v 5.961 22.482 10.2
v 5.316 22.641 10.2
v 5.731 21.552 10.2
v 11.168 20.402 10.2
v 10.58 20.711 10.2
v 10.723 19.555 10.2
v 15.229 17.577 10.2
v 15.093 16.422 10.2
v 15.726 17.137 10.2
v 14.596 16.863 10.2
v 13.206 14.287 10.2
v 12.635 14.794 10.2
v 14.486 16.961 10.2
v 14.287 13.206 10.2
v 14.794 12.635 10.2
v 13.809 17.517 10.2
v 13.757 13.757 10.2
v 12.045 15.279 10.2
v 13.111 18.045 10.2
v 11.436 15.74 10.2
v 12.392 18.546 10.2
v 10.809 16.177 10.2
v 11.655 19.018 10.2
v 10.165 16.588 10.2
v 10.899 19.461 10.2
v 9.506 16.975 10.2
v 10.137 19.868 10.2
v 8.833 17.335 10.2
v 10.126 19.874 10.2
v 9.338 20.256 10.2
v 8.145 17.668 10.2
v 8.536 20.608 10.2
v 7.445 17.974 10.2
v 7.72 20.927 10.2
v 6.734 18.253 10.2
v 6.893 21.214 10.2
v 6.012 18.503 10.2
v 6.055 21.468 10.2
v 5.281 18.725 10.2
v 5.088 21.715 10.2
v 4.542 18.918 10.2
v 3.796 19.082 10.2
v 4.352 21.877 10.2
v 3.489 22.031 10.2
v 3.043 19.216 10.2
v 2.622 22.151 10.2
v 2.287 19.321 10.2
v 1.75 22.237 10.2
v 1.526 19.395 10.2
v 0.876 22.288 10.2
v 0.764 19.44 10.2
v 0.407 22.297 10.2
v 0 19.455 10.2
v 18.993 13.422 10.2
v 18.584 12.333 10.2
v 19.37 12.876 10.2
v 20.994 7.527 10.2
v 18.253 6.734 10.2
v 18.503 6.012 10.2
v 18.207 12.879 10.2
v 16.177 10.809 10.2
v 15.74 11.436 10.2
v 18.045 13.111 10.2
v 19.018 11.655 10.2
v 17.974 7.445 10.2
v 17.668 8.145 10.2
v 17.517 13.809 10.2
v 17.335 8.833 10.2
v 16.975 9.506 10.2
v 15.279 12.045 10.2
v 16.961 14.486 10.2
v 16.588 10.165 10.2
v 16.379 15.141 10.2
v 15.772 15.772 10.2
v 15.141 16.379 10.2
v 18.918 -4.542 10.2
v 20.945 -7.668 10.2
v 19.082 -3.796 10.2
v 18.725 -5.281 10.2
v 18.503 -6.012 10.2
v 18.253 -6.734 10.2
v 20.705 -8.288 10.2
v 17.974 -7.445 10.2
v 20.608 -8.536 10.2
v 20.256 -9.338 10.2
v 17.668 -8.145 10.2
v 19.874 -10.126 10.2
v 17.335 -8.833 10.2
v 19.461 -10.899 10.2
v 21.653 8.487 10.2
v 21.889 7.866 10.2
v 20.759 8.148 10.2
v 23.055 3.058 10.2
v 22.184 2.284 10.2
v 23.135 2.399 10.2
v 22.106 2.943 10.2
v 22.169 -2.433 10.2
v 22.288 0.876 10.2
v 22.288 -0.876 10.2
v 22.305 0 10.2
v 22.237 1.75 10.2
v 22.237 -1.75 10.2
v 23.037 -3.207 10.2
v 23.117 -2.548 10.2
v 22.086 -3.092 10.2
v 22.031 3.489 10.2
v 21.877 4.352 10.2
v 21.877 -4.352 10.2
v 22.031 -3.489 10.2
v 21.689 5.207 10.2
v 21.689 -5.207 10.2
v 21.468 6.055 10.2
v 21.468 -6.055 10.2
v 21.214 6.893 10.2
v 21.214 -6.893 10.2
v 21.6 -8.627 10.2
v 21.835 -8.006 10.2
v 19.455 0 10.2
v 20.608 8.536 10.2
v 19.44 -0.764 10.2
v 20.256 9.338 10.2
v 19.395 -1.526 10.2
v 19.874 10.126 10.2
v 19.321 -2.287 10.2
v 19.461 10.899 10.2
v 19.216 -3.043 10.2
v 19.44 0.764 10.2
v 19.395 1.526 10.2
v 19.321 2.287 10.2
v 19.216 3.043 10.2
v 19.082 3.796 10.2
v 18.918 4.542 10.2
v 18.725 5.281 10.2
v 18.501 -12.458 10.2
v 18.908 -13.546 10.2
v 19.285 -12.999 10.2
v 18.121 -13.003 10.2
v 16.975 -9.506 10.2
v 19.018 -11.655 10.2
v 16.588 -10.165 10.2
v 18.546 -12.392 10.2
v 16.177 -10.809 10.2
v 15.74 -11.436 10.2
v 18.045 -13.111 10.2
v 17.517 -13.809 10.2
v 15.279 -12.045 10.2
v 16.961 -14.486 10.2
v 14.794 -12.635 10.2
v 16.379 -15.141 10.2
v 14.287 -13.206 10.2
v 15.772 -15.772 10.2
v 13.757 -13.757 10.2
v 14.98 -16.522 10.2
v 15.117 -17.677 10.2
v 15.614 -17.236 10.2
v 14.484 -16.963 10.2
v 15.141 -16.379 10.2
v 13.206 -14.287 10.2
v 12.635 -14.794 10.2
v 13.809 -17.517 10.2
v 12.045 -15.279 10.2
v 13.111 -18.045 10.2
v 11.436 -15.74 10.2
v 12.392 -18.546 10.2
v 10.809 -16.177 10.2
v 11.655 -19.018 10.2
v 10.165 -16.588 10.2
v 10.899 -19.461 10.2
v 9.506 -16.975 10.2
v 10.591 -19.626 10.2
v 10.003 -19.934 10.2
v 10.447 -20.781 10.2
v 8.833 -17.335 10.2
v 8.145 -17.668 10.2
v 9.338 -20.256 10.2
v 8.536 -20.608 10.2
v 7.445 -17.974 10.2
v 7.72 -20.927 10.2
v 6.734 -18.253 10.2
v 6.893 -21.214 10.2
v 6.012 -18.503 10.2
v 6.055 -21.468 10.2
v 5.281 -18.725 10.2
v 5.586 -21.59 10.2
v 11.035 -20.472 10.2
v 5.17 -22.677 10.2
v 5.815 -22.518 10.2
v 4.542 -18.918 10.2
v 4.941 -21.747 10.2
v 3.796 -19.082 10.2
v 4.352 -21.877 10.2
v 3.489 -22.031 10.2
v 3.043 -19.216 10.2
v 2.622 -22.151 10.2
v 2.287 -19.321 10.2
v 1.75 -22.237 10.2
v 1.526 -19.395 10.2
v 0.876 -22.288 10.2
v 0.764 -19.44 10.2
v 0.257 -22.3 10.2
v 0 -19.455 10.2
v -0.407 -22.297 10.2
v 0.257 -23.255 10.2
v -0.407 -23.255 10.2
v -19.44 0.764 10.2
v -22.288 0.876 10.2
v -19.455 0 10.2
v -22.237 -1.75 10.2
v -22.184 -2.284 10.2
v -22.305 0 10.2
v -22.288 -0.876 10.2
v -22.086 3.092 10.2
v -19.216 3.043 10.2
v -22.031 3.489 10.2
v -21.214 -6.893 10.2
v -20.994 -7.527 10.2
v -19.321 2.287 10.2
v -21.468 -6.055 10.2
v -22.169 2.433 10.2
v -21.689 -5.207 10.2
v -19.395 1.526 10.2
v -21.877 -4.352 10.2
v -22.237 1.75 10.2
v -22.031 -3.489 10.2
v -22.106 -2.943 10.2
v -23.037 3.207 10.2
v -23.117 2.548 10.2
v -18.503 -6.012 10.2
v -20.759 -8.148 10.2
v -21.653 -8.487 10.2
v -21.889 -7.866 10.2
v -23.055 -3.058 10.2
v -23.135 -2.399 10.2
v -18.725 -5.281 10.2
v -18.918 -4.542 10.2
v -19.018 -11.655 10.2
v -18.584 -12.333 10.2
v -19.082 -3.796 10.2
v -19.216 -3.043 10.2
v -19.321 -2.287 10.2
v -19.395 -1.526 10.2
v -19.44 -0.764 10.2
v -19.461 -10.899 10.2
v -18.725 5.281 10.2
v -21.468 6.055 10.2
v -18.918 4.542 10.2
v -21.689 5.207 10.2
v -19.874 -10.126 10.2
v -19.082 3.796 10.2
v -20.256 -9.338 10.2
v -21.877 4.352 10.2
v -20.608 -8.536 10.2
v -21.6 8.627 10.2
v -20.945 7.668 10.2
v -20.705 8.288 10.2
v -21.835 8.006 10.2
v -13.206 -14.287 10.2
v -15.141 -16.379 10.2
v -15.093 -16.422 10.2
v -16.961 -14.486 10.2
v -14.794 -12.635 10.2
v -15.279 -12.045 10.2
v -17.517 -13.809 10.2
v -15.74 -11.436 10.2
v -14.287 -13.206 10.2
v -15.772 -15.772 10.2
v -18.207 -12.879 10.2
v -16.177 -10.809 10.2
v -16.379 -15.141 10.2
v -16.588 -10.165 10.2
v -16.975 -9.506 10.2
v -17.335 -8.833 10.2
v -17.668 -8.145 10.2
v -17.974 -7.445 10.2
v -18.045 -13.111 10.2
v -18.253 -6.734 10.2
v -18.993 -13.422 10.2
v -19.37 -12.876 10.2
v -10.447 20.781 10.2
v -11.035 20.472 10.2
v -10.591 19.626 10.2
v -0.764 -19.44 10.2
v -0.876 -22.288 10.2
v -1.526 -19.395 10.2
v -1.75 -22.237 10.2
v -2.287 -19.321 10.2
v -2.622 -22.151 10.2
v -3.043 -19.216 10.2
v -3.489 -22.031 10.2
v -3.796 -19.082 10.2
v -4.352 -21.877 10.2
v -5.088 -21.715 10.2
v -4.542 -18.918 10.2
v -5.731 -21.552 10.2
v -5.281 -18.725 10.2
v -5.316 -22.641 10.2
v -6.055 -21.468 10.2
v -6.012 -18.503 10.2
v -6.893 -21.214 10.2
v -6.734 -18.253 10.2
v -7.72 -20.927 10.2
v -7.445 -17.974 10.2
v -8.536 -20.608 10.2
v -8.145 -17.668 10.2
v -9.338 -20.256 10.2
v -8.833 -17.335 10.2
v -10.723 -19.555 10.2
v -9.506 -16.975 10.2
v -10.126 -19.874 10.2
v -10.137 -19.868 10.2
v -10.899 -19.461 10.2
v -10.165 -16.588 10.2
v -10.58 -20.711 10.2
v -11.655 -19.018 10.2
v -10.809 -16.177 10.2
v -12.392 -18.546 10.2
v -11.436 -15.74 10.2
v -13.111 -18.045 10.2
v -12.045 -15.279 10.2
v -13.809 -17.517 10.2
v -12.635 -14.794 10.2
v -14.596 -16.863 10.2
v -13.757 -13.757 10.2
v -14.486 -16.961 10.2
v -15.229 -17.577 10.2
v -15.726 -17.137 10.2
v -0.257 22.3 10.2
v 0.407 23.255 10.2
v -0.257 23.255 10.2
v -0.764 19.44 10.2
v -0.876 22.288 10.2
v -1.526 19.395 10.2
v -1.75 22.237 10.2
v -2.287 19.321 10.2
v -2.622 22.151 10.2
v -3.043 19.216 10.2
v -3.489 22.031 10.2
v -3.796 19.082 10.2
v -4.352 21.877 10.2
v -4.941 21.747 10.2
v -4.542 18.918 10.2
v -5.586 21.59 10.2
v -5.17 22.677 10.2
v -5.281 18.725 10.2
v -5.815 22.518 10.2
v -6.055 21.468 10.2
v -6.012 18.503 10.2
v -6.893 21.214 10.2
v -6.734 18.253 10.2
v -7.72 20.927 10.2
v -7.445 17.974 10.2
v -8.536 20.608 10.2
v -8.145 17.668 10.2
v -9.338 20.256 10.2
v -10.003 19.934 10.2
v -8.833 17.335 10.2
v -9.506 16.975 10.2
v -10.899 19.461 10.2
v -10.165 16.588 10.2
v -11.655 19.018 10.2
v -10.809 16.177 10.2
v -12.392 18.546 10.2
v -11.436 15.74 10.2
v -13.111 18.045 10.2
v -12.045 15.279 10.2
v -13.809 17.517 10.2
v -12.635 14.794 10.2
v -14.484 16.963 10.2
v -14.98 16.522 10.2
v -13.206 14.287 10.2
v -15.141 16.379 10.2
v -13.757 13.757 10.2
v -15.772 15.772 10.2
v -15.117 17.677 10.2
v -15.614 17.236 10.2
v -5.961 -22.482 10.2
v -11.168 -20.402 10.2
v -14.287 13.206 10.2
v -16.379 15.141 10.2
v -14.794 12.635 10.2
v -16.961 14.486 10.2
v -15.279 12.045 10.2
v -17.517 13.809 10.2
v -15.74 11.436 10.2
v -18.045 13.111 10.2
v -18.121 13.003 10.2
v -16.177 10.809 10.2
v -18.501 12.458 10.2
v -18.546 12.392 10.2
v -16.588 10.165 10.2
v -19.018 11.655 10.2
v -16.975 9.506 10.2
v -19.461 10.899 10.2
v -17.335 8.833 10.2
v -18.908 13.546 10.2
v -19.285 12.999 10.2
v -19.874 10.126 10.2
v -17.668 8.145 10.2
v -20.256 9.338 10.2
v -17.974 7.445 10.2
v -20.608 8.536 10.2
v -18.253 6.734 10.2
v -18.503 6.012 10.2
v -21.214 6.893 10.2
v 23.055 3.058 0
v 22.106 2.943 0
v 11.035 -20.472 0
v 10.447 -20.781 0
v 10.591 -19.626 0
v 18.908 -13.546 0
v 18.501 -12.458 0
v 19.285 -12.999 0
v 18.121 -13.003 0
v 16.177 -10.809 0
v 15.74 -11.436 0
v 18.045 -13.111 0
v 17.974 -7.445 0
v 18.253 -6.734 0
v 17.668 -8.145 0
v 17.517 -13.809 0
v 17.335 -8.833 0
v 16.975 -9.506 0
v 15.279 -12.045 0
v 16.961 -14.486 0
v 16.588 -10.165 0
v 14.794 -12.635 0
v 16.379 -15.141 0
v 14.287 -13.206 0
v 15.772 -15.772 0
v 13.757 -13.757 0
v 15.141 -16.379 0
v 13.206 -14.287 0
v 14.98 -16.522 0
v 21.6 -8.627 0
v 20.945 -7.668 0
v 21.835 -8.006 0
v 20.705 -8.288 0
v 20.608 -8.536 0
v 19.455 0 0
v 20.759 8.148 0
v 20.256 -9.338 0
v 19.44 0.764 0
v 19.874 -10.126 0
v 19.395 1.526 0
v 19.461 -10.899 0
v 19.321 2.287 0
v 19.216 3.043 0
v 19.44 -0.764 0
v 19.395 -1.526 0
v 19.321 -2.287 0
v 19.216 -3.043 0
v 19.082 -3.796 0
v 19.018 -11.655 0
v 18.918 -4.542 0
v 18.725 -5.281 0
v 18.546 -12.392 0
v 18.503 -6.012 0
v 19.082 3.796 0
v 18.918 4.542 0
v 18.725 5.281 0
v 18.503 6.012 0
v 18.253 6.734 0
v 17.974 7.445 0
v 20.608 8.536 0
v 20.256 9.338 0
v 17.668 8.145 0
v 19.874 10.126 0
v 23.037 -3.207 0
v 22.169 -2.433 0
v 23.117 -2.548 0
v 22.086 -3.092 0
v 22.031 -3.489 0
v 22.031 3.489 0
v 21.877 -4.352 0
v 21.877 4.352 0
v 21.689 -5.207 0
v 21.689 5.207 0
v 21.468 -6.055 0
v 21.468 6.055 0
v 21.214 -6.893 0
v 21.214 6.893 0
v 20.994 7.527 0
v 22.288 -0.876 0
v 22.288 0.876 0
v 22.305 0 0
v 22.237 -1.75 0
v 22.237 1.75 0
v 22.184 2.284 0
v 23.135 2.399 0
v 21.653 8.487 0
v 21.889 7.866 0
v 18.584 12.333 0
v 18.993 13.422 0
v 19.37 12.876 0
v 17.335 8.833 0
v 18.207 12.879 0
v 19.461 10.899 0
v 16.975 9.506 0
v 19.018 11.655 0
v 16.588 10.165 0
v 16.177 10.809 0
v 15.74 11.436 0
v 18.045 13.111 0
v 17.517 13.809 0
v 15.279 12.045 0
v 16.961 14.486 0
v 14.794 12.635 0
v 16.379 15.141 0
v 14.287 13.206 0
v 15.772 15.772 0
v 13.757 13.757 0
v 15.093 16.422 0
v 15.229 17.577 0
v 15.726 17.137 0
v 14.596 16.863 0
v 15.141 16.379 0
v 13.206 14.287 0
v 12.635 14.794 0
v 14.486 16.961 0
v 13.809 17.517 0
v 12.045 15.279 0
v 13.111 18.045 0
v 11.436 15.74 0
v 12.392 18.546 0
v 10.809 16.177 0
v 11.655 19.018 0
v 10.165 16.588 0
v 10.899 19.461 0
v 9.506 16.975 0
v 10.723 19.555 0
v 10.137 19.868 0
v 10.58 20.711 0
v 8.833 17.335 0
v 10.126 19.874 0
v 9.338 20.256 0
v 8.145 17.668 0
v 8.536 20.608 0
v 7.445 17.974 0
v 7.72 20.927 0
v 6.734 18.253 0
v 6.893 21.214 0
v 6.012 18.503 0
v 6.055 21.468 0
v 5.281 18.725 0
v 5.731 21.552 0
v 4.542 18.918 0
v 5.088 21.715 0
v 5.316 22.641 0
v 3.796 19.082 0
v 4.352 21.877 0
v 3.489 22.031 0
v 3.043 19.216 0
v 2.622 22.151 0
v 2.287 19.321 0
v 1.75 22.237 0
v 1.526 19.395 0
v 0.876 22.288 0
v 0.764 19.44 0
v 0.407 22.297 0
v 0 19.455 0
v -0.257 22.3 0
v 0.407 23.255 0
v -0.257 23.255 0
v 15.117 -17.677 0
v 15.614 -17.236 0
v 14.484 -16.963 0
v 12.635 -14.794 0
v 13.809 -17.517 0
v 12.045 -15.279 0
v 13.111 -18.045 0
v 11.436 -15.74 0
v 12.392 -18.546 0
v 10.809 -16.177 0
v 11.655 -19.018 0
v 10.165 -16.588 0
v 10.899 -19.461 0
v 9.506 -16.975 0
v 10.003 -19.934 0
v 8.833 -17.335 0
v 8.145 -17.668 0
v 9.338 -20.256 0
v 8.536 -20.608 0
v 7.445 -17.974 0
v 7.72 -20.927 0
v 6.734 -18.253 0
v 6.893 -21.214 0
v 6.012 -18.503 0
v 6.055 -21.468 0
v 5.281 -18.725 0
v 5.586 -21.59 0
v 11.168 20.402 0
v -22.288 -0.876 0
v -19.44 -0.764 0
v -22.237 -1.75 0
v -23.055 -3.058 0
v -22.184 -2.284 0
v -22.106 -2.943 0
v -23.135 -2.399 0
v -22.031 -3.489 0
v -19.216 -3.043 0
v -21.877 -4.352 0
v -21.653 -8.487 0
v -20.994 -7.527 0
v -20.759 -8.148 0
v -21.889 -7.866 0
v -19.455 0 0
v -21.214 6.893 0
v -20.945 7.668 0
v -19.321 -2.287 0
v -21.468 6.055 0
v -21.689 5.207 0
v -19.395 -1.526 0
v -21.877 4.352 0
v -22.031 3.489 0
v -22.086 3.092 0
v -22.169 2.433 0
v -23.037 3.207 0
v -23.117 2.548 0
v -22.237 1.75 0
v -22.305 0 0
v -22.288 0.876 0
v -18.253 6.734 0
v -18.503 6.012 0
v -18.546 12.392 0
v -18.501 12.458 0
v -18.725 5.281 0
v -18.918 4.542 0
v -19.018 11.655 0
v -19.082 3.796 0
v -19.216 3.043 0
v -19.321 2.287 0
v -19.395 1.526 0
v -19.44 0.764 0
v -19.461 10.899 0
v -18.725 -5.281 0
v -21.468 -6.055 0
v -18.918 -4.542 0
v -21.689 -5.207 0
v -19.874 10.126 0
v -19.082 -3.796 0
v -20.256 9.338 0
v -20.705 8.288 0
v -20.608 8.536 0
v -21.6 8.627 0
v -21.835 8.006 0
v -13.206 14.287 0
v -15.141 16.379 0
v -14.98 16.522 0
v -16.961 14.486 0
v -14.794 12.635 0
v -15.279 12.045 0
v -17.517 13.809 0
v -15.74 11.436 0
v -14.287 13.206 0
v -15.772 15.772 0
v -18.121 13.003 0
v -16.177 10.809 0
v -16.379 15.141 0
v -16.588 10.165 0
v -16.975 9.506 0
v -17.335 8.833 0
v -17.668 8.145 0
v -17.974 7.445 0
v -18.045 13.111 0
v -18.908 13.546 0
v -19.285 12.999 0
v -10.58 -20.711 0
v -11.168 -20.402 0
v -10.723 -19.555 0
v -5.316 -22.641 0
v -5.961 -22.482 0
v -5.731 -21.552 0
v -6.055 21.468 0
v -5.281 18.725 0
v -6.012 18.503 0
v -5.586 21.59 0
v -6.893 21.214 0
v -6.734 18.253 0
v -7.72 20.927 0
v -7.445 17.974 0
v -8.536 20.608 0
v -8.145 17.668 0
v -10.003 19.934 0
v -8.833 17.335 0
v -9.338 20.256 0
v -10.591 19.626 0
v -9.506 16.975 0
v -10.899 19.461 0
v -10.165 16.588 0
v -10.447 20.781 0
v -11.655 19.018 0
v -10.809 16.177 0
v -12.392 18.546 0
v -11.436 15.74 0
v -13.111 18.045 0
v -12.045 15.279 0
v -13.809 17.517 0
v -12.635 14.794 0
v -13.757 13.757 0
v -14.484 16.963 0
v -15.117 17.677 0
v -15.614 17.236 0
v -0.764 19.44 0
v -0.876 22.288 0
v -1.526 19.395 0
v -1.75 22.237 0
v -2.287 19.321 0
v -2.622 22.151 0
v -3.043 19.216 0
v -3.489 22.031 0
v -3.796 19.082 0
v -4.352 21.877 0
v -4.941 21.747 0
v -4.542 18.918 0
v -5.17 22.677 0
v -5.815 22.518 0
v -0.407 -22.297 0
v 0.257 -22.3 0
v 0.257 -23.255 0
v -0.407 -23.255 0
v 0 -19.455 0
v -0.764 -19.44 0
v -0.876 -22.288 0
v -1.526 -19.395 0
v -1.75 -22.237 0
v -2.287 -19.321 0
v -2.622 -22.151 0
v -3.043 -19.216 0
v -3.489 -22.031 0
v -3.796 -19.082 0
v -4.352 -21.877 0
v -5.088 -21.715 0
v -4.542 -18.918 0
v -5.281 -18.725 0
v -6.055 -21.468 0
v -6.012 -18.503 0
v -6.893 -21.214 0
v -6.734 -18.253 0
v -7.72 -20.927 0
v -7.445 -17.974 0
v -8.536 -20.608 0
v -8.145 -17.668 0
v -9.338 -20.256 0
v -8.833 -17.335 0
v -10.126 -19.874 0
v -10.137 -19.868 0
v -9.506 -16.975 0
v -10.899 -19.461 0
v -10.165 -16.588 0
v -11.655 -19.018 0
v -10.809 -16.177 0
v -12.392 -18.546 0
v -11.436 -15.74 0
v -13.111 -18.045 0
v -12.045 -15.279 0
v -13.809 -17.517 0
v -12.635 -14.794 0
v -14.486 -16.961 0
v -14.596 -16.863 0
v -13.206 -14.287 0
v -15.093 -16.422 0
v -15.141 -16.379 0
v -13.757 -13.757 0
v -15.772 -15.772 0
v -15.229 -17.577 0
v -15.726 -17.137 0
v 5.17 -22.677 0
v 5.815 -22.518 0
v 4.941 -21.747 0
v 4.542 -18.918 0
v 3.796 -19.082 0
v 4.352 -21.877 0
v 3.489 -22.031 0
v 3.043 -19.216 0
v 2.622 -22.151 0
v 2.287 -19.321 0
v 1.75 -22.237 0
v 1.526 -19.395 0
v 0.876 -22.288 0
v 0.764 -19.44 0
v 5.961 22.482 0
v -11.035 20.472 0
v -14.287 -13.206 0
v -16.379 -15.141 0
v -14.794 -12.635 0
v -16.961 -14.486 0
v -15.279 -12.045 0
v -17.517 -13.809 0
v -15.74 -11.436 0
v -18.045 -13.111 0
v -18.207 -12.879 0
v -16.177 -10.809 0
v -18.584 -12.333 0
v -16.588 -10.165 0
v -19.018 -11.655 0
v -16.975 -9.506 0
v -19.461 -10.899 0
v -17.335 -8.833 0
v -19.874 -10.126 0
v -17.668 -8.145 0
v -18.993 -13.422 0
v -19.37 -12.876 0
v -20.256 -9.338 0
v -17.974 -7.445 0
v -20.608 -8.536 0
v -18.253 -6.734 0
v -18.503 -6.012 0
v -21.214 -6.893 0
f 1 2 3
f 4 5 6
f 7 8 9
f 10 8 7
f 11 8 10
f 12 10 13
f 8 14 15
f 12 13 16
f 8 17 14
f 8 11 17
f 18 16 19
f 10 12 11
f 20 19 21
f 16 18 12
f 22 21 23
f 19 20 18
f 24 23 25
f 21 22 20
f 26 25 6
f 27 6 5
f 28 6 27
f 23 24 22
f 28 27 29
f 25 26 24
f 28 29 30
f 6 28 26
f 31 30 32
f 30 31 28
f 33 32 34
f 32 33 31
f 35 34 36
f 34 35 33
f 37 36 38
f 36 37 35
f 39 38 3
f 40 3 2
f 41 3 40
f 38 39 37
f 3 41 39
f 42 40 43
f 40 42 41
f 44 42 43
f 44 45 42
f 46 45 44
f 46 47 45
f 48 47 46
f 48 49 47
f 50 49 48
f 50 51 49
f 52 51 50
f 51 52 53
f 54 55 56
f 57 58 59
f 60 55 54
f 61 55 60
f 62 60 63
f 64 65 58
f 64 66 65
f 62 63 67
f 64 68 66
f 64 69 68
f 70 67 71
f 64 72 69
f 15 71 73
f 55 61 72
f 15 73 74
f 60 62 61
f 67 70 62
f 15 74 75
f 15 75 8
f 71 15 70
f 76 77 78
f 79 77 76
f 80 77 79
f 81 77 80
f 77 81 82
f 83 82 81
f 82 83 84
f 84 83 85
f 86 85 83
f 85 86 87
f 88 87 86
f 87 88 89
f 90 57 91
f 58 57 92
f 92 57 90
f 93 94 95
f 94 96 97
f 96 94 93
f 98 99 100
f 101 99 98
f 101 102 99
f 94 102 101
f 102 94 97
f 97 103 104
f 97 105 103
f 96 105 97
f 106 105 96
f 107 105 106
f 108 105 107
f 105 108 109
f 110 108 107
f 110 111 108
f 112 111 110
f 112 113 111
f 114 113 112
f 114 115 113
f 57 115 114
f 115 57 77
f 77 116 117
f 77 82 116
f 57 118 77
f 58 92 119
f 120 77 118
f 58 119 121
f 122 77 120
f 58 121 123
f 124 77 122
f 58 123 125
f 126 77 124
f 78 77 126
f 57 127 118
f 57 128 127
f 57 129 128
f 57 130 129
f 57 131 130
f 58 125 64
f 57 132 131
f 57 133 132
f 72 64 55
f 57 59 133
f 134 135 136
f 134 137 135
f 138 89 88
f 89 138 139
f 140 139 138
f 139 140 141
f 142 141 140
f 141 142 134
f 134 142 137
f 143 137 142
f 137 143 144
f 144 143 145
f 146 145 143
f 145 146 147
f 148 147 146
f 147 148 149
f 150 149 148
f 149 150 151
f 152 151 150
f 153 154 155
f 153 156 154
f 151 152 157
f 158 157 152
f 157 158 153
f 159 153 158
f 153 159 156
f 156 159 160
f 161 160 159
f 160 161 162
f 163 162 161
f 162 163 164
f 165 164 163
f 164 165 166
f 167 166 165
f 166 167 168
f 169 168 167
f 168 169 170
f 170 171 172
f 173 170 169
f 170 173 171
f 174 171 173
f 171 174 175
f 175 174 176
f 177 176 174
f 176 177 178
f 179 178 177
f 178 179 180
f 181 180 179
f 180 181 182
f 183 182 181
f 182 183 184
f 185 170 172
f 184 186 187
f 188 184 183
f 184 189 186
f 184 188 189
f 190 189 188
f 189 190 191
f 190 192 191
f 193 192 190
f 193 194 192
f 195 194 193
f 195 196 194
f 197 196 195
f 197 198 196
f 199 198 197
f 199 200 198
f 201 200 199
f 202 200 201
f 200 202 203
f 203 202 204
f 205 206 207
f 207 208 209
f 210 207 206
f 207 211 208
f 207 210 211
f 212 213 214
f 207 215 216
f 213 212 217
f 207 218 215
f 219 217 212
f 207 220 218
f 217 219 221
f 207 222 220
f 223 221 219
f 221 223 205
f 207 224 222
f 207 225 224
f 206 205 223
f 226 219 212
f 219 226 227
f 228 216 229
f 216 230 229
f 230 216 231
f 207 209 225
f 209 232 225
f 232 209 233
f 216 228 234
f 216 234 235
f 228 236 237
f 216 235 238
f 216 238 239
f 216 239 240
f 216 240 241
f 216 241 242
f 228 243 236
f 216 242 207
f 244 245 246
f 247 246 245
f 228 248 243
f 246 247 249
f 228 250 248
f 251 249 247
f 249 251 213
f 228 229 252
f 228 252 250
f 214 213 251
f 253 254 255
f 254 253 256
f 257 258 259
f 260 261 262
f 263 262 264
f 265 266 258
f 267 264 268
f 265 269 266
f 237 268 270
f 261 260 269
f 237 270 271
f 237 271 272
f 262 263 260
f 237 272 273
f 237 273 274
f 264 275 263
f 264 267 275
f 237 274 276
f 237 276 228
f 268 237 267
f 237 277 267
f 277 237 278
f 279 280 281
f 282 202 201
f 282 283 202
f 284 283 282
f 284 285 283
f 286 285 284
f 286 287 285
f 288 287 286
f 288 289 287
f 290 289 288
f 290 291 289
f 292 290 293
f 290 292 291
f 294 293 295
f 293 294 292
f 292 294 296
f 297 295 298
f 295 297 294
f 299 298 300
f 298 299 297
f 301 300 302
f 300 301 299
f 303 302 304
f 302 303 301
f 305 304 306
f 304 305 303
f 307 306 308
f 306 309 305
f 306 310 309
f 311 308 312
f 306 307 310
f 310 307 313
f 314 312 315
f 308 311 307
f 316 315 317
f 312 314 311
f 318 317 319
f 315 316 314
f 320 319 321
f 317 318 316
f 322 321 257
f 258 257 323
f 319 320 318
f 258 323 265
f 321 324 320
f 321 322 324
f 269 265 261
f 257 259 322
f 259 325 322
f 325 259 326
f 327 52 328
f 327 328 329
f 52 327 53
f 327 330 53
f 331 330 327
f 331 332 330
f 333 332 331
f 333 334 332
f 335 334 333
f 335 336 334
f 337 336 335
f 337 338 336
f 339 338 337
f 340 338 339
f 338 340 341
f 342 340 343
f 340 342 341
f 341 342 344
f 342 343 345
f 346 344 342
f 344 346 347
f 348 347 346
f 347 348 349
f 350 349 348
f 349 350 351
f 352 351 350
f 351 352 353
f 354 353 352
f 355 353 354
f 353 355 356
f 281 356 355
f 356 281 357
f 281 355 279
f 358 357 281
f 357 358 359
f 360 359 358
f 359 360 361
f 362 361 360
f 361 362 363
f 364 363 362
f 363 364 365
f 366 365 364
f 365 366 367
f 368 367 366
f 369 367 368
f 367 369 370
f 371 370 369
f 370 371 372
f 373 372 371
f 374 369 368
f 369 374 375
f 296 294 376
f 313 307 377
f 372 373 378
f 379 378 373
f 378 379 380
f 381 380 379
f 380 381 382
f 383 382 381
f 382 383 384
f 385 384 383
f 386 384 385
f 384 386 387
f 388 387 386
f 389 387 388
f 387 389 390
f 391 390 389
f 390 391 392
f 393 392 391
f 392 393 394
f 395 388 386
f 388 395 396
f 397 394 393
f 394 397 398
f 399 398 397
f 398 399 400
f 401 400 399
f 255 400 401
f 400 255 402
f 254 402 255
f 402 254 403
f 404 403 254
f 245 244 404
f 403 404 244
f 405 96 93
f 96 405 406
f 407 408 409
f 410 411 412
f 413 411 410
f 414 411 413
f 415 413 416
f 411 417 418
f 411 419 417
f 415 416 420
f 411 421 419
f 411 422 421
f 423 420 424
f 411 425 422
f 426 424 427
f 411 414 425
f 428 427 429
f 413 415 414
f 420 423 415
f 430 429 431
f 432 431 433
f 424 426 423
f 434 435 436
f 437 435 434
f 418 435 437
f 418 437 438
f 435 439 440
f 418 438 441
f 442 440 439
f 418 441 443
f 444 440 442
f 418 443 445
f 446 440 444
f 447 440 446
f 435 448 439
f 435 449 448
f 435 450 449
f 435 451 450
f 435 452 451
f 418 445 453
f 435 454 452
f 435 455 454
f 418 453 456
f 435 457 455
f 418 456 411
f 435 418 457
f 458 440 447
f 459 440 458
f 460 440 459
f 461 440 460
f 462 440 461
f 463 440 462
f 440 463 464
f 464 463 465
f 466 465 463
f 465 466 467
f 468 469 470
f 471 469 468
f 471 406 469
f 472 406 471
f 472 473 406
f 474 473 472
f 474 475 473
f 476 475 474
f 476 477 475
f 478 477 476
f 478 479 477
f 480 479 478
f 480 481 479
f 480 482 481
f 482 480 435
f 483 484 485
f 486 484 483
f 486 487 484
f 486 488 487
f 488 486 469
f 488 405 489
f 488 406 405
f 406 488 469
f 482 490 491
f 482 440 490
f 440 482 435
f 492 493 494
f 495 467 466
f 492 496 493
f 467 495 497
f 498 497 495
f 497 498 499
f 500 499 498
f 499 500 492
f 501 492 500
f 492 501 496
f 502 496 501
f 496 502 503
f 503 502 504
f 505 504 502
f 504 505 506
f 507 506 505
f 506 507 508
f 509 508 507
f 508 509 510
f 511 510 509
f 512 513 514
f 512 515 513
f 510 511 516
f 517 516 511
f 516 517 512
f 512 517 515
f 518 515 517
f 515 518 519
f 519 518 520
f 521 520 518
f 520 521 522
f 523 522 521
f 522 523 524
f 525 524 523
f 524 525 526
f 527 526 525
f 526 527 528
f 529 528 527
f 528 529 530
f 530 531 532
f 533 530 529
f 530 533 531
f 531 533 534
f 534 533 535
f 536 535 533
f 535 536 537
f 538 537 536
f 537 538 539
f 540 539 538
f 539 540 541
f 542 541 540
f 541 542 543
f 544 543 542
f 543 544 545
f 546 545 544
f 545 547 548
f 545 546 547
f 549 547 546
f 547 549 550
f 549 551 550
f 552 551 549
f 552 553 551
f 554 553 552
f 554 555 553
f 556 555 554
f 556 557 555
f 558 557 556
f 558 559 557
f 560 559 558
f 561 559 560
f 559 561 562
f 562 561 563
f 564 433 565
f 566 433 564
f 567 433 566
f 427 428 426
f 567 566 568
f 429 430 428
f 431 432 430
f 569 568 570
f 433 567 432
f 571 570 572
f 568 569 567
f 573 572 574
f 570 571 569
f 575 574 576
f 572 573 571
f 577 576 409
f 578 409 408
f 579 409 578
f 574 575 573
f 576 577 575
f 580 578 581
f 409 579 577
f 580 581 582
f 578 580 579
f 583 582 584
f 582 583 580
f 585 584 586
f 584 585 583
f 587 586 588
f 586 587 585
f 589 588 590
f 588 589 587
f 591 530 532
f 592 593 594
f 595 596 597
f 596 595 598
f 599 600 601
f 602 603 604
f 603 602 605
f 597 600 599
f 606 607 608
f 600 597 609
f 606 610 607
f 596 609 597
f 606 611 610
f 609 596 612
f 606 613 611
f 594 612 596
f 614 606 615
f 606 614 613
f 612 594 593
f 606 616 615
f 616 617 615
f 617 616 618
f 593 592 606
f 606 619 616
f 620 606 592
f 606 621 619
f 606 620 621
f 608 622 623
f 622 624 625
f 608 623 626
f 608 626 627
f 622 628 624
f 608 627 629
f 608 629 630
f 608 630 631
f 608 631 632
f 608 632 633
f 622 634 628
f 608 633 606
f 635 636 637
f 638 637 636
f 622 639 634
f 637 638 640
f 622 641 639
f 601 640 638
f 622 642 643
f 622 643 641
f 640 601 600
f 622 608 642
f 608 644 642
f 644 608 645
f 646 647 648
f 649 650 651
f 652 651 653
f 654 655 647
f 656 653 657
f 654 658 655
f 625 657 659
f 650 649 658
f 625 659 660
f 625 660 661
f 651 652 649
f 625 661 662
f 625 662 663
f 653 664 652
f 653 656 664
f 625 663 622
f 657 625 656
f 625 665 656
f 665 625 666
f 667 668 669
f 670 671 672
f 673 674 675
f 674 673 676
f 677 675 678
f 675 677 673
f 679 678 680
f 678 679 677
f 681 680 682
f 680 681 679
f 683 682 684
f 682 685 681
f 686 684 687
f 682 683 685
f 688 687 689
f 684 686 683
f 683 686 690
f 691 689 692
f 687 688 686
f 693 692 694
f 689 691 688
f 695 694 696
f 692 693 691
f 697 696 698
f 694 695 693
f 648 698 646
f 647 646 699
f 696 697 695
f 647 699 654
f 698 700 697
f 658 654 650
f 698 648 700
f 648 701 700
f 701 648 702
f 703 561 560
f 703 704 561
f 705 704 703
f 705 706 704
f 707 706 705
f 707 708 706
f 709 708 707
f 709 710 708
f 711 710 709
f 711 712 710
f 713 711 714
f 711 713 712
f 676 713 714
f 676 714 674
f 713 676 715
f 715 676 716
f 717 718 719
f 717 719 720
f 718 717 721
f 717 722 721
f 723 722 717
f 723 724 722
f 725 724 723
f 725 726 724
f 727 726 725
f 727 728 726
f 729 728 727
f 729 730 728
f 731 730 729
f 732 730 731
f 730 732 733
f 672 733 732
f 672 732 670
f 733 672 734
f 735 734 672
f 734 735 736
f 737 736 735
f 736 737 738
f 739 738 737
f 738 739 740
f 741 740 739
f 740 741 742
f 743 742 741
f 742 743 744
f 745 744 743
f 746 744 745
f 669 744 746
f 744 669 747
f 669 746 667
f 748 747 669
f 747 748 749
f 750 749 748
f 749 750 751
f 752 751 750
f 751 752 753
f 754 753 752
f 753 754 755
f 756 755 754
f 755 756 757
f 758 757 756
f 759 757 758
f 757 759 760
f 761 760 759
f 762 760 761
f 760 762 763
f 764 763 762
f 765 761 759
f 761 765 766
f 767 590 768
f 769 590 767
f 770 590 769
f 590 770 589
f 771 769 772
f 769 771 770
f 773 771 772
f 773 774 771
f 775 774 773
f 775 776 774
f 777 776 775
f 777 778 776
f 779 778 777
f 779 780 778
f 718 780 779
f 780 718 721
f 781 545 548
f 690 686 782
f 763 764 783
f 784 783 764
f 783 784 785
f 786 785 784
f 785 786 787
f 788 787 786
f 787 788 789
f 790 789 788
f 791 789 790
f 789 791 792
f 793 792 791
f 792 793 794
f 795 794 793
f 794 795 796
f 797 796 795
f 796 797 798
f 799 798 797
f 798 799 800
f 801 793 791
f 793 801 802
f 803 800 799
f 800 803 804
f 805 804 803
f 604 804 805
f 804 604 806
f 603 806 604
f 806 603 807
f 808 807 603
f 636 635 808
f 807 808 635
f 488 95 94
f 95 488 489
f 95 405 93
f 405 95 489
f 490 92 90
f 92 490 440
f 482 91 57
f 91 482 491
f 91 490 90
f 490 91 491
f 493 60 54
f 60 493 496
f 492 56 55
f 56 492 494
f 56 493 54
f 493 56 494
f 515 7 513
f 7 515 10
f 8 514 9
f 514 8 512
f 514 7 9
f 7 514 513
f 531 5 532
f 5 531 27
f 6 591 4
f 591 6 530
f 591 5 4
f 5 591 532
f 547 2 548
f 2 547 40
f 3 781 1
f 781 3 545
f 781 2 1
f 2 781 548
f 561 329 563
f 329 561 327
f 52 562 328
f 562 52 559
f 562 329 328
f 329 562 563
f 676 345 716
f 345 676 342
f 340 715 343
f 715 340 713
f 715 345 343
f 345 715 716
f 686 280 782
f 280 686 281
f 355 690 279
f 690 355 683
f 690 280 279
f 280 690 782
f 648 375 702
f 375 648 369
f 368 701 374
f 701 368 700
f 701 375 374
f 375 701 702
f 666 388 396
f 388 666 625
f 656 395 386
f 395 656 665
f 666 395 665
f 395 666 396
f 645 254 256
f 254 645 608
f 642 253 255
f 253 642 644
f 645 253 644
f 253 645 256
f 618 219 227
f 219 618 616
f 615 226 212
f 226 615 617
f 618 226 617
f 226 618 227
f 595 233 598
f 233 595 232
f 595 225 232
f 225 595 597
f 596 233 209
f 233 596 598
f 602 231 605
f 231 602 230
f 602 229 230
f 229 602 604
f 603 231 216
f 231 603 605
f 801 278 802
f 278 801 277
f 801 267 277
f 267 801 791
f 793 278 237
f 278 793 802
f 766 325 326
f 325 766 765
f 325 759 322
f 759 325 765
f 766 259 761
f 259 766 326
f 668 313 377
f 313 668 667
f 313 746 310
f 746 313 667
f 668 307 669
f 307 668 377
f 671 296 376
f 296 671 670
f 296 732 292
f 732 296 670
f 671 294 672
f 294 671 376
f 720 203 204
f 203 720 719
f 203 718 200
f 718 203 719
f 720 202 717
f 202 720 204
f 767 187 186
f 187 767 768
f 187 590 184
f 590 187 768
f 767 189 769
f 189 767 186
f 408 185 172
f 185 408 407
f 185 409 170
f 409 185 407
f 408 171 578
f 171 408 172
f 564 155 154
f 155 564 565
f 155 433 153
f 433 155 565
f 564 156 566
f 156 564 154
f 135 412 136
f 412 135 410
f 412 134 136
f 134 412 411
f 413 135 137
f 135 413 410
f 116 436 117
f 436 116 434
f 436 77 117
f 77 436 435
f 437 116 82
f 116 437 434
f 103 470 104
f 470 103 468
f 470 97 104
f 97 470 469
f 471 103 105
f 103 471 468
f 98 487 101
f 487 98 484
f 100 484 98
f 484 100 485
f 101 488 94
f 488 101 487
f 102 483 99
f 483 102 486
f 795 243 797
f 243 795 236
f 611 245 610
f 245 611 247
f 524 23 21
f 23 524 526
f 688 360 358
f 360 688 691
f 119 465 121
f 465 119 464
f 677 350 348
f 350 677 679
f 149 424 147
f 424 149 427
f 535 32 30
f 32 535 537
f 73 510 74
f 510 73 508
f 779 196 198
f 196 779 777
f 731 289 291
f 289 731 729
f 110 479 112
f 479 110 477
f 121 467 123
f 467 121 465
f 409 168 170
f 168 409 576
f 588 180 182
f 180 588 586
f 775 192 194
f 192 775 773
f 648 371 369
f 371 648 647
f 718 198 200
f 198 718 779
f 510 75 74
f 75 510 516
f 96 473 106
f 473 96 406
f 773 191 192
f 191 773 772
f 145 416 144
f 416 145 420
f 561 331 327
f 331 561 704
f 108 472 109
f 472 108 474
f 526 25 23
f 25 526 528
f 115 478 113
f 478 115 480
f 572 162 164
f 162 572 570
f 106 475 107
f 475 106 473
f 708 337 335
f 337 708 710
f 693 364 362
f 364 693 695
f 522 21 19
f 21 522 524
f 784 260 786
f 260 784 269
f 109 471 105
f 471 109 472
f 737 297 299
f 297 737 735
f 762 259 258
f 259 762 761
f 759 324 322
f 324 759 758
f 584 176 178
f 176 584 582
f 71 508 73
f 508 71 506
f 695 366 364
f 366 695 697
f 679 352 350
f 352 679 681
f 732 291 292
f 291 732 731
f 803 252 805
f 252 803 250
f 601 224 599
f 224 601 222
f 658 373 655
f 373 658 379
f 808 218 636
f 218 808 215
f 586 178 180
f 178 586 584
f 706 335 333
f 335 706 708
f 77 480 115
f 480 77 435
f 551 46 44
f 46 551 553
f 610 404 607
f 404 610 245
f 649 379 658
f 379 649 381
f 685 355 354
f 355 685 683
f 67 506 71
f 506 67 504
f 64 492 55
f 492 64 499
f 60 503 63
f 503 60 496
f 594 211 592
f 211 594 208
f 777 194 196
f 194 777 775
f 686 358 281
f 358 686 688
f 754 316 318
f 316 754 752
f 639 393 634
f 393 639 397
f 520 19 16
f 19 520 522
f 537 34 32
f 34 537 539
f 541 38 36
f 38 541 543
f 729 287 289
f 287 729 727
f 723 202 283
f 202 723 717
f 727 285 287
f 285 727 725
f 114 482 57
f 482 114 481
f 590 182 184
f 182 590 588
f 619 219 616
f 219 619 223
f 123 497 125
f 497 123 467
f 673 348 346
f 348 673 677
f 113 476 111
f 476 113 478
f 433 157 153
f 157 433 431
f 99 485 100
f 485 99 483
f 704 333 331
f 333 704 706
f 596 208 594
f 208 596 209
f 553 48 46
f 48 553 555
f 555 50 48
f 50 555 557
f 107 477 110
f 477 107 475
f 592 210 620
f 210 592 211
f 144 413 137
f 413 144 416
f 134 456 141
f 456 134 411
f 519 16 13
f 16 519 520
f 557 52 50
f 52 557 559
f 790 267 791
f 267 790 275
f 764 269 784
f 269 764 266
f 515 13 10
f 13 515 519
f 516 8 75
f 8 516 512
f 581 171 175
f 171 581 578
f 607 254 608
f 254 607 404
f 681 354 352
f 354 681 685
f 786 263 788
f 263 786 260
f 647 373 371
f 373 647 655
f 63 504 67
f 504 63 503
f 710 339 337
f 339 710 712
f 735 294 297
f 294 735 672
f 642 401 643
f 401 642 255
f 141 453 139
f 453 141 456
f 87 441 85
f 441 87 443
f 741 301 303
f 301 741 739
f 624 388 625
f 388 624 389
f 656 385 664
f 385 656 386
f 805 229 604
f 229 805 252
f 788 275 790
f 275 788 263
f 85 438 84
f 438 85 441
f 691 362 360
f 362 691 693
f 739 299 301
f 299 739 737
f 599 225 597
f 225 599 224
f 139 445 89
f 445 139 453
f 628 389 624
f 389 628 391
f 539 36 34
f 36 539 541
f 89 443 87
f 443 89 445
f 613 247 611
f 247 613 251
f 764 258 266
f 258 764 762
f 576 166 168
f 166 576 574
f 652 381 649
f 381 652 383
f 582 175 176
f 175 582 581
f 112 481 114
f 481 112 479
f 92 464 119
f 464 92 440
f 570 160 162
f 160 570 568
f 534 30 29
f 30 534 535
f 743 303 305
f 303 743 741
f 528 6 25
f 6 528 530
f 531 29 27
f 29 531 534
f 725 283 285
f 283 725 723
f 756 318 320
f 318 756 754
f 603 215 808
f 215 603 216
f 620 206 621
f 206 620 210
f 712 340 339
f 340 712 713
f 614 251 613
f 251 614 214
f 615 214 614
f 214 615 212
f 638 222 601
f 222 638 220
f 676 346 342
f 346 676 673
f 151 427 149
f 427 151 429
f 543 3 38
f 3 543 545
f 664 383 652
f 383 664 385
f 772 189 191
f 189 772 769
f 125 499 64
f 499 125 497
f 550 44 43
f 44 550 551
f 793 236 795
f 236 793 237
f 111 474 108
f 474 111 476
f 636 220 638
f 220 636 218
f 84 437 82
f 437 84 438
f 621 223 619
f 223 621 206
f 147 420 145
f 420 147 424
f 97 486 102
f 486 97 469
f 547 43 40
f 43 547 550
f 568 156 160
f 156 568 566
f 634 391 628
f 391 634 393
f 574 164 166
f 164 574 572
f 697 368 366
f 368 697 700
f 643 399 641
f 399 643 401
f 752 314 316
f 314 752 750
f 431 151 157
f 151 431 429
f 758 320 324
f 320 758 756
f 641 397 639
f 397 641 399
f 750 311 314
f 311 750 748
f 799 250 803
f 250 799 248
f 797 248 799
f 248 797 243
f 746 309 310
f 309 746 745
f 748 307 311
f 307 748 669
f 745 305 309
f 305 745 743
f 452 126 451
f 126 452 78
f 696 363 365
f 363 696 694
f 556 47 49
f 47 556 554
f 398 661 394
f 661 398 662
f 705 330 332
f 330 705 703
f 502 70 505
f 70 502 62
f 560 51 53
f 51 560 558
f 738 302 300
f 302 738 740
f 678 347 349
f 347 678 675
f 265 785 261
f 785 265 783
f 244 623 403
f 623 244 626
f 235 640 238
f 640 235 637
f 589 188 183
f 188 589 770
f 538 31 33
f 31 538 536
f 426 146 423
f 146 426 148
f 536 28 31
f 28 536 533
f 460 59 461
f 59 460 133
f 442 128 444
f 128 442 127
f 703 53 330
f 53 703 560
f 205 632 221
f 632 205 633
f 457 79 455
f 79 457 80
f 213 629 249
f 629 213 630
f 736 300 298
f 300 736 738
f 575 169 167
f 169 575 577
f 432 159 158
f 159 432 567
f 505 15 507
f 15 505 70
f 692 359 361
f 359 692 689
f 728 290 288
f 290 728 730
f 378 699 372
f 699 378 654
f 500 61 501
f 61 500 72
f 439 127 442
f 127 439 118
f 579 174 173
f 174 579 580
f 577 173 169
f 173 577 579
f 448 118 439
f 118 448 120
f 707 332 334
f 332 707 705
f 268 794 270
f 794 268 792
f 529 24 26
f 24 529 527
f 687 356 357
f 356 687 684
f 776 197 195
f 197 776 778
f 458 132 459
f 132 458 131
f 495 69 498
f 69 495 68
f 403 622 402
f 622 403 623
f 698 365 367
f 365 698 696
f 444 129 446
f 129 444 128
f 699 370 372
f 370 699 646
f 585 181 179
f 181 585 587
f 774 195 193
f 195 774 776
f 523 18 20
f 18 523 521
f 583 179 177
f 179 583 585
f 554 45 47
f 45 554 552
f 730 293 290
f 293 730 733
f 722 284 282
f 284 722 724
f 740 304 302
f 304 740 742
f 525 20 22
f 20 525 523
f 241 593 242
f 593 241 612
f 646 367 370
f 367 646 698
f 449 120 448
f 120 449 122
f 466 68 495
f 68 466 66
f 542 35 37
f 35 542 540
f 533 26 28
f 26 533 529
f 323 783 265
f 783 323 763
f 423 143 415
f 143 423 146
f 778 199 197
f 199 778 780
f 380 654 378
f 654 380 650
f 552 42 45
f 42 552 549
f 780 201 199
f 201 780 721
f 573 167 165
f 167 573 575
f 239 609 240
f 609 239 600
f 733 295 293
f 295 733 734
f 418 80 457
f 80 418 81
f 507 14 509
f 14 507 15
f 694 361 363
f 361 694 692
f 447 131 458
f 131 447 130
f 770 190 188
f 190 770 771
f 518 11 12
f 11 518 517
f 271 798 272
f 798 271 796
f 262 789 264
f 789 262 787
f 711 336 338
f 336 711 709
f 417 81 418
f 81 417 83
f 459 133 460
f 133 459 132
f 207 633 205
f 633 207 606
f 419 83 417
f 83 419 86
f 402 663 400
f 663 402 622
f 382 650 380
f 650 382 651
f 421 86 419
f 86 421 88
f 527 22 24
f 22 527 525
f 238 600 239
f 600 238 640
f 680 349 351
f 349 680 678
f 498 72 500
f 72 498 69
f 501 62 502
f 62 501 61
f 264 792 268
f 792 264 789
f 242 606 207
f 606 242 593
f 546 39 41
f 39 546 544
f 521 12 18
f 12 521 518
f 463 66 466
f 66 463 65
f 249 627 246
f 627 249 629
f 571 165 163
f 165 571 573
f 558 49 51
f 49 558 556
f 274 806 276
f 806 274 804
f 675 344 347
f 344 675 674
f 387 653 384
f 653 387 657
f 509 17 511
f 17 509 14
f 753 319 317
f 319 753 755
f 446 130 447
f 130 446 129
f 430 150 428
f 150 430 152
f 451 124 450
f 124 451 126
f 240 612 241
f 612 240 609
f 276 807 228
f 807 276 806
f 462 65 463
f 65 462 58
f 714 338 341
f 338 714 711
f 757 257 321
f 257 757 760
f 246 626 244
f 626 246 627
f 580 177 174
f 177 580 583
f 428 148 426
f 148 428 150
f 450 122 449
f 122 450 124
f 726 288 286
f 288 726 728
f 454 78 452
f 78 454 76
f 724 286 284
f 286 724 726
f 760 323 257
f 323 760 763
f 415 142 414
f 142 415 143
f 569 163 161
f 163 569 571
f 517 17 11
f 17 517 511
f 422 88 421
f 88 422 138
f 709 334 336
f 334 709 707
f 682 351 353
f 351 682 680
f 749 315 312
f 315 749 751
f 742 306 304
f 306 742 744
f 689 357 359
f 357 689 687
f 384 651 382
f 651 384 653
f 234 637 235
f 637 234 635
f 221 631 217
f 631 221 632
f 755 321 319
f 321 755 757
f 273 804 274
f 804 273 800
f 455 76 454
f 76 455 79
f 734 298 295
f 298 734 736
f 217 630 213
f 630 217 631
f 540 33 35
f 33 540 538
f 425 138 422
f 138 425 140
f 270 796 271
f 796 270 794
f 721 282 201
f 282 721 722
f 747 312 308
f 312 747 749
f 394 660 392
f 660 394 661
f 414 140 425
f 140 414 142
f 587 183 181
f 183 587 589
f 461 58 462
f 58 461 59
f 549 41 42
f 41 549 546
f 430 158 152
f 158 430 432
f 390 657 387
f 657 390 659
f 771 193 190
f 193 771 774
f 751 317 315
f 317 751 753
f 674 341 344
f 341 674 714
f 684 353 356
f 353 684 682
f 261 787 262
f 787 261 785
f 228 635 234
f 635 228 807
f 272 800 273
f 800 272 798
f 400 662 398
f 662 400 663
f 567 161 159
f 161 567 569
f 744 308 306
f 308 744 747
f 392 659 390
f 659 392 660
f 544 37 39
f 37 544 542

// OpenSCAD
// file: motor_lib.scad
// Biblioteca del motor DronSwarm (M6). Las medidas vienen de <dron>_motor_params.scad (generado). Unidades: mm.
// Sin hull/minkowski (CLAUDE.md): todo con cilindros, polígonos y extrusiones.
$fn = 160;

// ---------- láser ----------
module stator_lamination_2d() {           // lámina del estator: 0.2 mm de acero al silicio (NO20)
    difference() {
        circle(r = r_s);
        circle(r = r_bore);
        for (s = slots) polygon(s);
        translate([r_bore - 0.01, -1.0]) square([1.2, 2.0]);                 // chaveta: alinea las láminas y fija al tubo
    }
}
module rotor_ring_2d() {                  // anillo del rotor: acero común 1 mm, se apilan n_ring
    difference() {
        circle(r = r_out);
        circle(r = r_mag_out + fit_slide / 2);
        translate([r_mag_out, -0.75]) square([0.8, 1.5]);                     // marca de orientación (polo 1)
    }
}

// ---------- impresas ----------
module cap() {                            // tapa: lleva la hélice y el eje; el anillo del rotor entra 2 mm en la ranura
    hub_r = shaft / 2 + 3.5;
    difference() {
        union() {
            cylinder(r = r_out + 1.2, h = cap_t);
            translate([0, 0, -2]) difference() {                                 // pollera que abraza el anillo
                cylinder(r = r_out + 1.2, h = 2);
                translate([0, 0, -0.1]) cylinder(r = r_out + print_clear / 2, h = 2.2);
            }
            cylinder(r = hub_r, h = cap_t + 4);                                  // cubo del eje
        }
        translate([0, 0, -1]) cylinder(d = shaft + fit_press, h = cap_t + 6);   // eje a presión
        translate([0, 0, cap_t + 2]) rotate([0, 90, 0]) cylinder(d = 2.6, h = hub_r + 1);   // prisionero M3
        for (i = [0 : prop_n - 1]) rotate(360 / prop_n * i + 45)
            translate([prop_pcd / 2, 0, -1]) cylinder(d = prop_bolt, h = cap_t + 6);
        for (i = [0 : prop_n - 1]) rotate(360 / prop_n * i)                      // ventilación entre los tornillos de la hélice
            translate([0, 0, -1]) linear_extrude(cap_t + 2)
                polygon([[ (hub_r + 2) * cos(-14), (hub_r + 2) * sin(-14)], [ (r_mag_in - 3) * cos(-18), (r_mag_in - 3) * sin(-18)],
                         [ (r_mag_in - 3) * cos(18), (r_mag_in - 3) * sin(18)], [ (hub_r + 2) * cos(14), (hub_r + 2) * sin(14)]]);
    }
}

module base() {                           // base: tubo con los 2 rodamientos, sostiene el estator, se atornilla al DMI
    tube_h = l_stack + 2 * overhang + 1;
    difference() {
        union() {
            cylinder(r = max(r_bore + 5, dmi_pcd / 2 + 4), h = base_t);
            cylinder(r = r_bore + fit_press / 2, h = base_t + tube_h);               // el estator se pega sobre el tubo
            translate([r_bore - 0.2, -0.9, base_t]) cube([1.0, 1.8, tube_h]);        // chaveta (entra en la muesca de las láminas)
        }
        translate([0, 0, -1]) cylinder(d = bearing_od + fit_press, h = bearing_w + 1);                  // rodamiento inferior
        translate([0, 0, base_t + tube_h - bearing_w]) cylinder(d = bearing_od + fit_press, h = bearing_w + 1); // superior
        translate([0, 0, -1]) cylinder(d = shaft + 1.0, h = base_t + tube_h + 2);
        for (i = [0 : dmi_n - 1]) rotate(360 / dmi_n * i + 45) translate([dmi_pcd / 2, 0, -1]) cylinder(d = dmi_bolt, h = base_t + 2);
        translate([r_bore - 4, -2, -1]) cube([6, 4, base_t + 2]);                 // salida de los 3 cables de fase
    }
}

module magnet_jig() {                     // peine: se mete dentro del anillo y deja cada imán en su lugar (paso de polo exacto)
    rib = 2 * PI * r_mag_in / poles - magnet_w;      // espacio entre imanes en el diámetro interior
    difference() {
        union() {
            cylinder(r = r_mag_in - 0.15, h = l_stack + 4);
            for (i = [0 : poles - 1]) rotate(360 / poles * (i + 0.5))
                translate([r_mag_in - 0.5, -max(rib, 0.6) / 2, 0]) cube([h_magnet + 0.3, max(rib, 0.6) - 0.15, l_stack + 4]);
        }
        translate([0, 0, -1]) cylinder(r = r_mag_in - 3, h = l_stack + 6);
    }
}

module stack_mandrel() {                  // mandril de apilado: alinea las láminas por el agujero y la chaveta mientras cura el adhesivo
    difference() {
        union() {
            cylinder(r = r_bore - 0.05, h = l_stack + 10);
            translate([r_bore - 0.3, -0.9, 0]) cube([1.0, 1.8, l_stack + 10]);
            cylinder(r = r_s + 3, h = 3);
        }
        translate([0, 0, -1]) cylinder(d = 5.5, h = l_stack + 12);                // varilla roscada M5 para prensar
    }
}

module winding_holder() {                 // soporte para bobinar a mano: sujeta el estator por el agujero, con mango
    union() {
        cylinder(r = r_bore - 0.1, h = l_stack + 2);
        translate([r_bore - 0.4, -0.85, 0]) cube([1.0, 1.7, l_stack + 2]);
        translate([0, 0, -40]) cylinder(r = 7, h = 40);
    }
}

// ---------- ensamble (para ver) ----------
module assembly() {
    color("#b0b0b0") translate([0, 0, base_t + overhang]) linear_extrude(l_stack) stator_lamination_2d();
    color("#b87333") for (s = slots) translate([0, 0, base_t + 0.5]) linear_extrude(l_stack + 2 * overhang - 1) offset(r = -0.35) polygon(s);
    color("#4a4a4a") translate([0, 0, base_t + overhang - 1]) linear_extrude(l_stack + 2) rotor_ring_2d();
    color("#2a78d6") for (i = [0 : poles - 1]) rotate(360 / poles * i)
        translate([0, 0, base_t + overhang]) rotate_extrude(angle = 360 / poles * pole_arc)
            translate([r_mag_in, 0]) square([h_magnet, l_stack]);
    color("#eb6834") translate([0, 0, base_t + 2 * overhang + l_stack + 1]) cap();
    color("#eb6834", 0.9) base();
    color("#dddddd") translate([0, 0, -6]) cylinder(d = shaft, h = base_t + 2 * overhang + l_stack + cap_t + 14);
}
// main file
// DS-I · plantilla_imanes (M6). Generado por motor/fabricacion/gen_cad.py
include <ds_i_motor_params.scad>
include <motor_lib.scad>
magnet_jig();
